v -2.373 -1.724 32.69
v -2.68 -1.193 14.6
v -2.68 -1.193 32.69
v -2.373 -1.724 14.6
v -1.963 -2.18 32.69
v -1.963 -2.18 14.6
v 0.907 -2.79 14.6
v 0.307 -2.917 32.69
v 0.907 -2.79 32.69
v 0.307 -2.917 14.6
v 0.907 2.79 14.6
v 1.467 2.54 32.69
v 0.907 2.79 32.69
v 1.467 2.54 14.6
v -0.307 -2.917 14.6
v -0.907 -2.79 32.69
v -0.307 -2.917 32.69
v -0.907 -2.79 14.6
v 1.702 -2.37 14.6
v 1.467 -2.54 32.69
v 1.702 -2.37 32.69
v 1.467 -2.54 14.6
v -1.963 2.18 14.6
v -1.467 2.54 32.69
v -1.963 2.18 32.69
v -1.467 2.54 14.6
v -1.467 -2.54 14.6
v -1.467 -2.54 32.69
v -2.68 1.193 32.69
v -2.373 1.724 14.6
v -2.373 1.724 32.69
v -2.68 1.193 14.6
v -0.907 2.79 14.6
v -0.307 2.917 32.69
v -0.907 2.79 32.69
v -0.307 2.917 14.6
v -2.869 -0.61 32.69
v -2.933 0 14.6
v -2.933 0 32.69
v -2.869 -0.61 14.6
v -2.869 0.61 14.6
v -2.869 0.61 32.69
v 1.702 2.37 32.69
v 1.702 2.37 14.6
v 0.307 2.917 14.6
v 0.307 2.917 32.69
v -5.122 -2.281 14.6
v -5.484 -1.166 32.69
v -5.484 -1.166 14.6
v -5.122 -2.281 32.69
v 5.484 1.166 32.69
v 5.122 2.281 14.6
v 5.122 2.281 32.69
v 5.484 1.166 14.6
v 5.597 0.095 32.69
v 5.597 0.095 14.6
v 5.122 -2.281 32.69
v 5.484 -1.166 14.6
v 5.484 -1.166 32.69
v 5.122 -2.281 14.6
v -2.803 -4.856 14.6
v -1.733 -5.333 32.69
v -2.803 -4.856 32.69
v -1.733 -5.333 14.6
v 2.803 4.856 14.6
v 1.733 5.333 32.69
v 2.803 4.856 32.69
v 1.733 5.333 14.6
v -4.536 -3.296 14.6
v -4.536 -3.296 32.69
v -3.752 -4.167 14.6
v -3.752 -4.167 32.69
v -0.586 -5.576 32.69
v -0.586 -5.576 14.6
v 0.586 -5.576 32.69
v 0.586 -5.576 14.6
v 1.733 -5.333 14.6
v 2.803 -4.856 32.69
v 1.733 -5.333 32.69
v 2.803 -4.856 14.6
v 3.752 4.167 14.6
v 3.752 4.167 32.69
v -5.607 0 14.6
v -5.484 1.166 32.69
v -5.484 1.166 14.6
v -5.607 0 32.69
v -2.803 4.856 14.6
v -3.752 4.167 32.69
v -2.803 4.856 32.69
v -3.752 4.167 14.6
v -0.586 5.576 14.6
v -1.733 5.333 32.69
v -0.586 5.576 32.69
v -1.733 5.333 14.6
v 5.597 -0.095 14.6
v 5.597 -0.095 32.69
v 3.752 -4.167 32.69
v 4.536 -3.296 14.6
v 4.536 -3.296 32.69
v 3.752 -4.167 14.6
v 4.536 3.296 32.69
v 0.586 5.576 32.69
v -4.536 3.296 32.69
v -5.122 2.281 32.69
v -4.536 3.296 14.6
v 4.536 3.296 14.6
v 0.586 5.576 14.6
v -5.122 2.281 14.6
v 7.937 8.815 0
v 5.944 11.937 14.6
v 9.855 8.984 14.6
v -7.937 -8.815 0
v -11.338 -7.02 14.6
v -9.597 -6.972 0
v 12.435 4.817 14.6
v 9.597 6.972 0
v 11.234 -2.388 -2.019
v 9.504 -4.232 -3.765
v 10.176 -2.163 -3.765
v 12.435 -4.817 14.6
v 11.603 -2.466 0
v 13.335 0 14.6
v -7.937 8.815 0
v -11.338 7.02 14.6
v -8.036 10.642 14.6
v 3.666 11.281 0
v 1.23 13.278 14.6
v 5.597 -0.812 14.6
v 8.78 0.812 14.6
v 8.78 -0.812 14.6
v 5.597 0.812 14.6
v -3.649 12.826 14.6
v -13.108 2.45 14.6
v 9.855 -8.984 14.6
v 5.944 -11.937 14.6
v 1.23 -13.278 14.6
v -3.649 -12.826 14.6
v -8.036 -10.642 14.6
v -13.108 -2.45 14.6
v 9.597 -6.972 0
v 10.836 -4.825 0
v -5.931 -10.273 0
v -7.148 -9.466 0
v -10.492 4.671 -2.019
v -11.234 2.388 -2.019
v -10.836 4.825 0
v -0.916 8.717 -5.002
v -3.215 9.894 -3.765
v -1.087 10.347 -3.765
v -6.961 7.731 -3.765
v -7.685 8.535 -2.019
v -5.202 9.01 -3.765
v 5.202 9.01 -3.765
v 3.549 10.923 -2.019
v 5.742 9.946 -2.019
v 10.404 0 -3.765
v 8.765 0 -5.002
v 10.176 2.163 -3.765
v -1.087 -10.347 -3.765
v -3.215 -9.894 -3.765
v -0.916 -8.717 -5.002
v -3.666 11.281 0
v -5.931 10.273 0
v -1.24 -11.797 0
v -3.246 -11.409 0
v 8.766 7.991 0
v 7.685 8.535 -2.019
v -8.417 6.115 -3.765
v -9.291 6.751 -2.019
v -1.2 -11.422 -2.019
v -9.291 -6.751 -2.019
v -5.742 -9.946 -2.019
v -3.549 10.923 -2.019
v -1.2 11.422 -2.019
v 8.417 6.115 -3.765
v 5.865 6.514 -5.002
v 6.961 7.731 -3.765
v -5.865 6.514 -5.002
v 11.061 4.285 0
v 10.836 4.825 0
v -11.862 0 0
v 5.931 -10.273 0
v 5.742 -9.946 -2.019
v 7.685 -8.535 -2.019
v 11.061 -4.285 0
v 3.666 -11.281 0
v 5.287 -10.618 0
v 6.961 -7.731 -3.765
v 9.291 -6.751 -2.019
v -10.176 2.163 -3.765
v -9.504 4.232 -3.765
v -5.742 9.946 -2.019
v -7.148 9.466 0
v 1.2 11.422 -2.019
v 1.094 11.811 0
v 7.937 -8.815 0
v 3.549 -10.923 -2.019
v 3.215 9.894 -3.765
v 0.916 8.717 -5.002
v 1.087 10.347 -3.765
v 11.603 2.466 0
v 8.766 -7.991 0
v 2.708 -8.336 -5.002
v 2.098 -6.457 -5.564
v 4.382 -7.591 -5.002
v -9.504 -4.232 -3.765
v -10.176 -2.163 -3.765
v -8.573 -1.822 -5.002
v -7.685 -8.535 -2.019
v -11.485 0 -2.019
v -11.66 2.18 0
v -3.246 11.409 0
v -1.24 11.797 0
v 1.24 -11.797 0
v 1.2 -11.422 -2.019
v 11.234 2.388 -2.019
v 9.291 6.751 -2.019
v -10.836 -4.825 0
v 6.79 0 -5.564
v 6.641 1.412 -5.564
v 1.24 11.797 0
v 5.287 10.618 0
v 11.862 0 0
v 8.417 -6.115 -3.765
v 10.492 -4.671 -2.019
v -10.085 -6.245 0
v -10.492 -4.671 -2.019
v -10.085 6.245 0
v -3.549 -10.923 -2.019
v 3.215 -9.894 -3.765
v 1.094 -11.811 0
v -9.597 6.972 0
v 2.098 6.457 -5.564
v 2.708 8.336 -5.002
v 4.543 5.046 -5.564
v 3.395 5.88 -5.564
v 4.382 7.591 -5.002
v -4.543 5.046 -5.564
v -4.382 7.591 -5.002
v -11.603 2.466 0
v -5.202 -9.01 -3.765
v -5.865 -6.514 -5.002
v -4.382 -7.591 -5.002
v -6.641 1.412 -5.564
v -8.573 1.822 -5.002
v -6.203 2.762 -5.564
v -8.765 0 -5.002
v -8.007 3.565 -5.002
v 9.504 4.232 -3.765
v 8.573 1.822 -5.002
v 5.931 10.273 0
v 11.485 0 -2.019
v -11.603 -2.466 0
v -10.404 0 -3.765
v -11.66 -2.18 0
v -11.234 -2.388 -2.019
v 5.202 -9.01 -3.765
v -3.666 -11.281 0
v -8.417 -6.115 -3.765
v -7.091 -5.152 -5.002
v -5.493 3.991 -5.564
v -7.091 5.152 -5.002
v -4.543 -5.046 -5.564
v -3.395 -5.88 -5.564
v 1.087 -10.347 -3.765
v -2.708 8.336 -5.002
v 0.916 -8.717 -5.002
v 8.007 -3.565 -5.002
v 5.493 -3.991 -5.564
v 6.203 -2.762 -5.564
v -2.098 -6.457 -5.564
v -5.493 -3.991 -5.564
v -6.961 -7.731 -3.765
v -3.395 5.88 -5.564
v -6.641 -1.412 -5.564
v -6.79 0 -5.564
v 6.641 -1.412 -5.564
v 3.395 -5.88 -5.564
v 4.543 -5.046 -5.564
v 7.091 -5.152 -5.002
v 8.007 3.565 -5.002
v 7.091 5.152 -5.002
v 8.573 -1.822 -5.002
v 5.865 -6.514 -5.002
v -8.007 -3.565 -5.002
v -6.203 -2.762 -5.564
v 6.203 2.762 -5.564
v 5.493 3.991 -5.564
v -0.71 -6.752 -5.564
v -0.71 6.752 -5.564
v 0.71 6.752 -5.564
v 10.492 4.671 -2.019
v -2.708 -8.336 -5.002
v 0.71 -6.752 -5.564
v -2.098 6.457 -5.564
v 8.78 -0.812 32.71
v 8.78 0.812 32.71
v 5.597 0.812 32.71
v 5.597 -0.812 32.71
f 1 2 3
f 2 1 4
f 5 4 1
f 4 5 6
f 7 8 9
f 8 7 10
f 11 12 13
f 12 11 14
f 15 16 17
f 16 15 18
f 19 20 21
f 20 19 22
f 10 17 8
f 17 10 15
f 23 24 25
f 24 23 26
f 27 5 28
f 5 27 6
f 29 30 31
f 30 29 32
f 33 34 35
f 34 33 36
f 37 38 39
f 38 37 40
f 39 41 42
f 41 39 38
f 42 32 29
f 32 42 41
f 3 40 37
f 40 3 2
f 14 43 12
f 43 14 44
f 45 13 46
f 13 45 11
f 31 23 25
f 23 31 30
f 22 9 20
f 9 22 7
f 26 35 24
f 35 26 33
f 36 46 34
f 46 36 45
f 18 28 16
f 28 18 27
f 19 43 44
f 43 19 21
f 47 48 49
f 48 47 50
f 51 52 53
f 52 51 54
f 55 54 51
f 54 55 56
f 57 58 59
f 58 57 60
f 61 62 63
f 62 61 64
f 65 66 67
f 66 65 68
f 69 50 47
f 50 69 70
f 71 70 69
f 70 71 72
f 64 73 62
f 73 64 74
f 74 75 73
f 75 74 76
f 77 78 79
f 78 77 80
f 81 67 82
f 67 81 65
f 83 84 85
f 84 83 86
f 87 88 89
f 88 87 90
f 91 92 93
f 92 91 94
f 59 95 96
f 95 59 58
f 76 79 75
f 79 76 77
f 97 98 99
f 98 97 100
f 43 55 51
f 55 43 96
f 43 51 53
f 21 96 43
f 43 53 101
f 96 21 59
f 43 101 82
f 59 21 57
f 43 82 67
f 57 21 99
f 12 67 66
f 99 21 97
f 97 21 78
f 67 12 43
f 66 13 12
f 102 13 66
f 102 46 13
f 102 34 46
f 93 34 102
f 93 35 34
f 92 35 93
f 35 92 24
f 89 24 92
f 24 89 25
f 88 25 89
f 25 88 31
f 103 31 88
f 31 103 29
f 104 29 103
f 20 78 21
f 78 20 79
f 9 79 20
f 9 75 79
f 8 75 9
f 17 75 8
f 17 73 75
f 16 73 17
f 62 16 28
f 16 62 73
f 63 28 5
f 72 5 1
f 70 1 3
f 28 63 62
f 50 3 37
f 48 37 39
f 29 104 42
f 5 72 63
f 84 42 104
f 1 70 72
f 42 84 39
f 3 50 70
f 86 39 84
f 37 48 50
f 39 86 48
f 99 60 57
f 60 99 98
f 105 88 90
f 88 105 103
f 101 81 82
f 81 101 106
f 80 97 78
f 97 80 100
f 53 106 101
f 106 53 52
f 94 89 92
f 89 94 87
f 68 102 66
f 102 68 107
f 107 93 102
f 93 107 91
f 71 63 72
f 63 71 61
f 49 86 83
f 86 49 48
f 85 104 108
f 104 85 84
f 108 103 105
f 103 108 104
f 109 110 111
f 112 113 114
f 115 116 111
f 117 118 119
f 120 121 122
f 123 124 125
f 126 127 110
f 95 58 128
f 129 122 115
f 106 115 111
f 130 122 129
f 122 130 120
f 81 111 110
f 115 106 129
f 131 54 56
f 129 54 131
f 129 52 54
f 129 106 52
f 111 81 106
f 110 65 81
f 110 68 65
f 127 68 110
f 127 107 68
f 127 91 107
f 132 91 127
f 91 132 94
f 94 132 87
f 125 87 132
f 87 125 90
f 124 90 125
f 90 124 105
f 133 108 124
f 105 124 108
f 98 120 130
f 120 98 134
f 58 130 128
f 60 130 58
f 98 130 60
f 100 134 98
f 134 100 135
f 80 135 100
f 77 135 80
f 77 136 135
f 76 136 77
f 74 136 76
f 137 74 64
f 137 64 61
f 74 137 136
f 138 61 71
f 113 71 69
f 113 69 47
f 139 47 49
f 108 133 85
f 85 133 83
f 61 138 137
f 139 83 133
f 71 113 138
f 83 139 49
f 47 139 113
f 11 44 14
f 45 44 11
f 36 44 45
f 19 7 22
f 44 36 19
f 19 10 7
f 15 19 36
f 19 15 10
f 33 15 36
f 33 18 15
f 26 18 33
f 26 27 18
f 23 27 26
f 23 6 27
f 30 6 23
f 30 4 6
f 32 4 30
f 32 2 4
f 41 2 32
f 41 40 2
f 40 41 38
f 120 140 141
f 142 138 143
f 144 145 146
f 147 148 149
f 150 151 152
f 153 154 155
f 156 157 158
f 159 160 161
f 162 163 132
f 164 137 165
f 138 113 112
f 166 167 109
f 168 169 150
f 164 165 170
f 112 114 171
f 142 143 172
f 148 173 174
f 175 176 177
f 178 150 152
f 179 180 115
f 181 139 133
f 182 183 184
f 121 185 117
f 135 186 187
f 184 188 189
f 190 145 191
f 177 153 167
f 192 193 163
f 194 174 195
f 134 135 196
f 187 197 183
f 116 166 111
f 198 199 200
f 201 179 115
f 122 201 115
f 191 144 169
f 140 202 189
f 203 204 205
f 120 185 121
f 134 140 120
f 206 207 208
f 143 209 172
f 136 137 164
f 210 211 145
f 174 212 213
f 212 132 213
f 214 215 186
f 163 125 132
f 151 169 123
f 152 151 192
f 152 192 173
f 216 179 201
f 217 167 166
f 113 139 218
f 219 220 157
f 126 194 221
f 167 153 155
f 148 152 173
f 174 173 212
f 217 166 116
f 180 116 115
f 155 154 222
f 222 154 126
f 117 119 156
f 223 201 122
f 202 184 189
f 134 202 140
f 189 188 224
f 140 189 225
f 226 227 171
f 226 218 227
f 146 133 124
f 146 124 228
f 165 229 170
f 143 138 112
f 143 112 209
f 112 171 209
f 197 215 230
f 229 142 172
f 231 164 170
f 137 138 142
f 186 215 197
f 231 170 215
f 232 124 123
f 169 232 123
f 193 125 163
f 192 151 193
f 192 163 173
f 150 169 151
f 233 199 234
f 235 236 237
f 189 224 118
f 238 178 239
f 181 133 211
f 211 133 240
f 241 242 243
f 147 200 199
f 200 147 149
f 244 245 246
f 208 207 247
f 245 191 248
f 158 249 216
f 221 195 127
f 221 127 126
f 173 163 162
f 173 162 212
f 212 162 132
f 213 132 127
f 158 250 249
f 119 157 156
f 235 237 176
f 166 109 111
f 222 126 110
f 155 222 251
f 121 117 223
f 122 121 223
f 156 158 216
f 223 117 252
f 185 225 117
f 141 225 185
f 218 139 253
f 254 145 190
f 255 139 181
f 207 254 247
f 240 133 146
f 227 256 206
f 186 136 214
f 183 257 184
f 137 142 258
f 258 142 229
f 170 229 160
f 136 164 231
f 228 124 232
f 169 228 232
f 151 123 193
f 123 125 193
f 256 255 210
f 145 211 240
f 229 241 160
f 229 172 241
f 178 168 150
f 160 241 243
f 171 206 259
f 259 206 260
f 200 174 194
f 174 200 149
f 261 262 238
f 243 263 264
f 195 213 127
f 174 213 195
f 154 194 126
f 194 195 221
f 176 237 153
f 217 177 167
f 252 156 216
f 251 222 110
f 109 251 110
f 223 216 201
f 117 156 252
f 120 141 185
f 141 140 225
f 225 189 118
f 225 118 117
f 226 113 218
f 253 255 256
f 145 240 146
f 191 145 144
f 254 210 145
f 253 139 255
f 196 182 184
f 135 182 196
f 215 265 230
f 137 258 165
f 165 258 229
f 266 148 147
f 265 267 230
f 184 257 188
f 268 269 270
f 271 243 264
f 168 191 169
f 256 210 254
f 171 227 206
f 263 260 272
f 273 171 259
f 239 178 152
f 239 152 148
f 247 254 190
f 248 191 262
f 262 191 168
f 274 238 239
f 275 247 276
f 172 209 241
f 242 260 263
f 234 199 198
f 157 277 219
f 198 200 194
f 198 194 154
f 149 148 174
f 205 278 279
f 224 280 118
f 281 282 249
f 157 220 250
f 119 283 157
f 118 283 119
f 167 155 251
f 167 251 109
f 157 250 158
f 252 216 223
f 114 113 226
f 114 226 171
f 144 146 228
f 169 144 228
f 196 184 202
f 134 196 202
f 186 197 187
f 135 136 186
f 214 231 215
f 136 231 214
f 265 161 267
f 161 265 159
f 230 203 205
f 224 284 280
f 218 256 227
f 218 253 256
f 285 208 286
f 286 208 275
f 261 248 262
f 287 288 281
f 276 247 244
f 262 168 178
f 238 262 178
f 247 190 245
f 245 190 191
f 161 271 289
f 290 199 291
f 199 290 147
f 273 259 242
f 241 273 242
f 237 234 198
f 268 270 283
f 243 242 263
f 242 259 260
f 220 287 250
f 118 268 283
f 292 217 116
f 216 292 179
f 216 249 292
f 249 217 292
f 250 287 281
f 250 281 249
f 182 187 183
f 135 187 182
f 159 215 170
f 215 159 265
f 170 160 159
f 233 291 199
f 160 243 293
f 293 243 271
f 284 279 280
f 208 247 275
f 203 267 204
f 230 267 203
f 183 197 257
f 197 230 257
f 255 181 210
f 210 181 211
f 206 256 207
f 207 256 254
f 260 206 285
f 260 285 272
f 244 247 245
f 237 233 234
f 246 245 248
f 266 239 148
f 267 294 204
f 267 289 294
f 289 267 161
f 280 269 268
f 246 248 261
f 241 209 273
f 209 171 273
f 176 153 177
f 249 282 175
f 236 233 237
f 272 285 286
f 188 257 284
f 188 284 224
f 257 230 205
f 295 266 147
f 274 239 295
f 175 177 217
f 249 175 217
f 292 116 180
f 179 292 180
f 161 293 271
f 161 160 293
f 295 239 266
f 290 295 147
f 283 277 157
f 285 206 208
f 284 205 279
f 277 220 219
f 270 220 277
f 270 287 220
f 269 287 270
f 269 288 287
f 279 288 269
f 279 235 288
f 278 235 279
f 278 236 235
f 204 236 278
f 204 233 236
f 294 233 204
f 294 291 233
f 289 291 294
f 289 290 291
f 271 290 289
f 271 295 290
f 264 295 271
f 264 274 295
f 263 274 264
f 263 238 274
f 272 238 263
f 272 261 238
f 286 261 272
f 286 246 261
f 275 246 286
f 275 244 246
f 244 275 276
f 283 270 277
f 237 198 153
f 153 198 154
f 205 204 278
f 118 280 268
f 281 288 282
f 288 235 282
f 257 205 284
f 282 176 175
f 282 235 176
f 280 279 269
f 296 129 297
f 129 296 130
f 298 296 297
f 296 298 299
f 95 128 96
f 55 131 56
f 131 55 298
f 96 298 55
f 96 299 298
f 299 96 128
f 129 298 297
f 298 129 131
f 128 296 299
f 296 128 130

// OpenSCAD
//****************************************************
//****************************************************
//General purpose keyed knob.
//by Marc Sulfridge
//****************************************************
//****************************************************

//****************************************************
//Start of user defined parameters.
//****************************************************

//Radius of the rounded fillet at the base of the knob.
fillet_r = 5.588; // [1:10]
//Narrow (bottom) radius of the knob.
min_r = 11.862; // [5:20]
//Wide (top) radius of the knob.
max_r = 13.335; // [5:20]
//Total height of the knob base.
base_h = 20.188; // [5:50]
//Calculated height of the non-fillet portion of the base.
cyl_h = base_h - fillet_r;
//Number of facets for base circle.
base_res = 17; // [10,11,12,13,14,15,16,17,18,19,20]
//Outer shaft radius.
shaft_r = 5.607; // [1:10]
// Shaft height.
shaft_h = 18.1; // [5:50]
//Inner shaft radius.
shaft_in_r = 2.9335; // [0.5:8]
//Width from shaft flat to edge of shaft inner radius.
shaft_in_min_wid = 4.6355; // [0.5:16]
//Number of facets for shaft circle.
shaft_res = 30; // [20,22,24,26,28,30,32,34,36,38,40]
//Thickness of shaft key.
key_th = 1.625; // [0.25:4]
//Width of shaft key from shaft outer radius to end of key.
key_wid = 3.183; // [1:20]
//Number that is large compared to dimensions of the knob.
BIG = 40; // [30,40,50,60,70,80,90,100]
//Fudge factor to ensure overlaps.
dt = 0.01; // [0.001,0.01,0.1]
//****************************************************

// preview[view:north west, tilt:top diagonal]

union(){
	hull(){
		rotate_extrude(convexity = 10){
			translate([min_r-fillet_r, 0])
			circle(r = fillet_r,$fn=base_res);
		}
	cylinder(r1=min_r,r2=max_r,h=cyl_h,center=false,$fn=base_res);
	}

	translate([0,0,cyl_h-dt])
	difference(){
		cylinder(r=shaft_r,h=shaft_h,center=false,$fn=shaft_res);

		difference(){
			cylinder(r=shaft_in_r,h=shaft_h+2*dt,center=false,$fn=shaft_res);

			translate([shaft_in_min_wid-shaft_in_r,-BIG/2,-BIG/2])
			cube([BIG,BIG,BIG],center=false);
		}
	}

	translate([shaft_r-dt,-key_th/2,cyl_h-dt])
	cube([key_wid,key_th,shaft_h+2*dt],center=false);
}
